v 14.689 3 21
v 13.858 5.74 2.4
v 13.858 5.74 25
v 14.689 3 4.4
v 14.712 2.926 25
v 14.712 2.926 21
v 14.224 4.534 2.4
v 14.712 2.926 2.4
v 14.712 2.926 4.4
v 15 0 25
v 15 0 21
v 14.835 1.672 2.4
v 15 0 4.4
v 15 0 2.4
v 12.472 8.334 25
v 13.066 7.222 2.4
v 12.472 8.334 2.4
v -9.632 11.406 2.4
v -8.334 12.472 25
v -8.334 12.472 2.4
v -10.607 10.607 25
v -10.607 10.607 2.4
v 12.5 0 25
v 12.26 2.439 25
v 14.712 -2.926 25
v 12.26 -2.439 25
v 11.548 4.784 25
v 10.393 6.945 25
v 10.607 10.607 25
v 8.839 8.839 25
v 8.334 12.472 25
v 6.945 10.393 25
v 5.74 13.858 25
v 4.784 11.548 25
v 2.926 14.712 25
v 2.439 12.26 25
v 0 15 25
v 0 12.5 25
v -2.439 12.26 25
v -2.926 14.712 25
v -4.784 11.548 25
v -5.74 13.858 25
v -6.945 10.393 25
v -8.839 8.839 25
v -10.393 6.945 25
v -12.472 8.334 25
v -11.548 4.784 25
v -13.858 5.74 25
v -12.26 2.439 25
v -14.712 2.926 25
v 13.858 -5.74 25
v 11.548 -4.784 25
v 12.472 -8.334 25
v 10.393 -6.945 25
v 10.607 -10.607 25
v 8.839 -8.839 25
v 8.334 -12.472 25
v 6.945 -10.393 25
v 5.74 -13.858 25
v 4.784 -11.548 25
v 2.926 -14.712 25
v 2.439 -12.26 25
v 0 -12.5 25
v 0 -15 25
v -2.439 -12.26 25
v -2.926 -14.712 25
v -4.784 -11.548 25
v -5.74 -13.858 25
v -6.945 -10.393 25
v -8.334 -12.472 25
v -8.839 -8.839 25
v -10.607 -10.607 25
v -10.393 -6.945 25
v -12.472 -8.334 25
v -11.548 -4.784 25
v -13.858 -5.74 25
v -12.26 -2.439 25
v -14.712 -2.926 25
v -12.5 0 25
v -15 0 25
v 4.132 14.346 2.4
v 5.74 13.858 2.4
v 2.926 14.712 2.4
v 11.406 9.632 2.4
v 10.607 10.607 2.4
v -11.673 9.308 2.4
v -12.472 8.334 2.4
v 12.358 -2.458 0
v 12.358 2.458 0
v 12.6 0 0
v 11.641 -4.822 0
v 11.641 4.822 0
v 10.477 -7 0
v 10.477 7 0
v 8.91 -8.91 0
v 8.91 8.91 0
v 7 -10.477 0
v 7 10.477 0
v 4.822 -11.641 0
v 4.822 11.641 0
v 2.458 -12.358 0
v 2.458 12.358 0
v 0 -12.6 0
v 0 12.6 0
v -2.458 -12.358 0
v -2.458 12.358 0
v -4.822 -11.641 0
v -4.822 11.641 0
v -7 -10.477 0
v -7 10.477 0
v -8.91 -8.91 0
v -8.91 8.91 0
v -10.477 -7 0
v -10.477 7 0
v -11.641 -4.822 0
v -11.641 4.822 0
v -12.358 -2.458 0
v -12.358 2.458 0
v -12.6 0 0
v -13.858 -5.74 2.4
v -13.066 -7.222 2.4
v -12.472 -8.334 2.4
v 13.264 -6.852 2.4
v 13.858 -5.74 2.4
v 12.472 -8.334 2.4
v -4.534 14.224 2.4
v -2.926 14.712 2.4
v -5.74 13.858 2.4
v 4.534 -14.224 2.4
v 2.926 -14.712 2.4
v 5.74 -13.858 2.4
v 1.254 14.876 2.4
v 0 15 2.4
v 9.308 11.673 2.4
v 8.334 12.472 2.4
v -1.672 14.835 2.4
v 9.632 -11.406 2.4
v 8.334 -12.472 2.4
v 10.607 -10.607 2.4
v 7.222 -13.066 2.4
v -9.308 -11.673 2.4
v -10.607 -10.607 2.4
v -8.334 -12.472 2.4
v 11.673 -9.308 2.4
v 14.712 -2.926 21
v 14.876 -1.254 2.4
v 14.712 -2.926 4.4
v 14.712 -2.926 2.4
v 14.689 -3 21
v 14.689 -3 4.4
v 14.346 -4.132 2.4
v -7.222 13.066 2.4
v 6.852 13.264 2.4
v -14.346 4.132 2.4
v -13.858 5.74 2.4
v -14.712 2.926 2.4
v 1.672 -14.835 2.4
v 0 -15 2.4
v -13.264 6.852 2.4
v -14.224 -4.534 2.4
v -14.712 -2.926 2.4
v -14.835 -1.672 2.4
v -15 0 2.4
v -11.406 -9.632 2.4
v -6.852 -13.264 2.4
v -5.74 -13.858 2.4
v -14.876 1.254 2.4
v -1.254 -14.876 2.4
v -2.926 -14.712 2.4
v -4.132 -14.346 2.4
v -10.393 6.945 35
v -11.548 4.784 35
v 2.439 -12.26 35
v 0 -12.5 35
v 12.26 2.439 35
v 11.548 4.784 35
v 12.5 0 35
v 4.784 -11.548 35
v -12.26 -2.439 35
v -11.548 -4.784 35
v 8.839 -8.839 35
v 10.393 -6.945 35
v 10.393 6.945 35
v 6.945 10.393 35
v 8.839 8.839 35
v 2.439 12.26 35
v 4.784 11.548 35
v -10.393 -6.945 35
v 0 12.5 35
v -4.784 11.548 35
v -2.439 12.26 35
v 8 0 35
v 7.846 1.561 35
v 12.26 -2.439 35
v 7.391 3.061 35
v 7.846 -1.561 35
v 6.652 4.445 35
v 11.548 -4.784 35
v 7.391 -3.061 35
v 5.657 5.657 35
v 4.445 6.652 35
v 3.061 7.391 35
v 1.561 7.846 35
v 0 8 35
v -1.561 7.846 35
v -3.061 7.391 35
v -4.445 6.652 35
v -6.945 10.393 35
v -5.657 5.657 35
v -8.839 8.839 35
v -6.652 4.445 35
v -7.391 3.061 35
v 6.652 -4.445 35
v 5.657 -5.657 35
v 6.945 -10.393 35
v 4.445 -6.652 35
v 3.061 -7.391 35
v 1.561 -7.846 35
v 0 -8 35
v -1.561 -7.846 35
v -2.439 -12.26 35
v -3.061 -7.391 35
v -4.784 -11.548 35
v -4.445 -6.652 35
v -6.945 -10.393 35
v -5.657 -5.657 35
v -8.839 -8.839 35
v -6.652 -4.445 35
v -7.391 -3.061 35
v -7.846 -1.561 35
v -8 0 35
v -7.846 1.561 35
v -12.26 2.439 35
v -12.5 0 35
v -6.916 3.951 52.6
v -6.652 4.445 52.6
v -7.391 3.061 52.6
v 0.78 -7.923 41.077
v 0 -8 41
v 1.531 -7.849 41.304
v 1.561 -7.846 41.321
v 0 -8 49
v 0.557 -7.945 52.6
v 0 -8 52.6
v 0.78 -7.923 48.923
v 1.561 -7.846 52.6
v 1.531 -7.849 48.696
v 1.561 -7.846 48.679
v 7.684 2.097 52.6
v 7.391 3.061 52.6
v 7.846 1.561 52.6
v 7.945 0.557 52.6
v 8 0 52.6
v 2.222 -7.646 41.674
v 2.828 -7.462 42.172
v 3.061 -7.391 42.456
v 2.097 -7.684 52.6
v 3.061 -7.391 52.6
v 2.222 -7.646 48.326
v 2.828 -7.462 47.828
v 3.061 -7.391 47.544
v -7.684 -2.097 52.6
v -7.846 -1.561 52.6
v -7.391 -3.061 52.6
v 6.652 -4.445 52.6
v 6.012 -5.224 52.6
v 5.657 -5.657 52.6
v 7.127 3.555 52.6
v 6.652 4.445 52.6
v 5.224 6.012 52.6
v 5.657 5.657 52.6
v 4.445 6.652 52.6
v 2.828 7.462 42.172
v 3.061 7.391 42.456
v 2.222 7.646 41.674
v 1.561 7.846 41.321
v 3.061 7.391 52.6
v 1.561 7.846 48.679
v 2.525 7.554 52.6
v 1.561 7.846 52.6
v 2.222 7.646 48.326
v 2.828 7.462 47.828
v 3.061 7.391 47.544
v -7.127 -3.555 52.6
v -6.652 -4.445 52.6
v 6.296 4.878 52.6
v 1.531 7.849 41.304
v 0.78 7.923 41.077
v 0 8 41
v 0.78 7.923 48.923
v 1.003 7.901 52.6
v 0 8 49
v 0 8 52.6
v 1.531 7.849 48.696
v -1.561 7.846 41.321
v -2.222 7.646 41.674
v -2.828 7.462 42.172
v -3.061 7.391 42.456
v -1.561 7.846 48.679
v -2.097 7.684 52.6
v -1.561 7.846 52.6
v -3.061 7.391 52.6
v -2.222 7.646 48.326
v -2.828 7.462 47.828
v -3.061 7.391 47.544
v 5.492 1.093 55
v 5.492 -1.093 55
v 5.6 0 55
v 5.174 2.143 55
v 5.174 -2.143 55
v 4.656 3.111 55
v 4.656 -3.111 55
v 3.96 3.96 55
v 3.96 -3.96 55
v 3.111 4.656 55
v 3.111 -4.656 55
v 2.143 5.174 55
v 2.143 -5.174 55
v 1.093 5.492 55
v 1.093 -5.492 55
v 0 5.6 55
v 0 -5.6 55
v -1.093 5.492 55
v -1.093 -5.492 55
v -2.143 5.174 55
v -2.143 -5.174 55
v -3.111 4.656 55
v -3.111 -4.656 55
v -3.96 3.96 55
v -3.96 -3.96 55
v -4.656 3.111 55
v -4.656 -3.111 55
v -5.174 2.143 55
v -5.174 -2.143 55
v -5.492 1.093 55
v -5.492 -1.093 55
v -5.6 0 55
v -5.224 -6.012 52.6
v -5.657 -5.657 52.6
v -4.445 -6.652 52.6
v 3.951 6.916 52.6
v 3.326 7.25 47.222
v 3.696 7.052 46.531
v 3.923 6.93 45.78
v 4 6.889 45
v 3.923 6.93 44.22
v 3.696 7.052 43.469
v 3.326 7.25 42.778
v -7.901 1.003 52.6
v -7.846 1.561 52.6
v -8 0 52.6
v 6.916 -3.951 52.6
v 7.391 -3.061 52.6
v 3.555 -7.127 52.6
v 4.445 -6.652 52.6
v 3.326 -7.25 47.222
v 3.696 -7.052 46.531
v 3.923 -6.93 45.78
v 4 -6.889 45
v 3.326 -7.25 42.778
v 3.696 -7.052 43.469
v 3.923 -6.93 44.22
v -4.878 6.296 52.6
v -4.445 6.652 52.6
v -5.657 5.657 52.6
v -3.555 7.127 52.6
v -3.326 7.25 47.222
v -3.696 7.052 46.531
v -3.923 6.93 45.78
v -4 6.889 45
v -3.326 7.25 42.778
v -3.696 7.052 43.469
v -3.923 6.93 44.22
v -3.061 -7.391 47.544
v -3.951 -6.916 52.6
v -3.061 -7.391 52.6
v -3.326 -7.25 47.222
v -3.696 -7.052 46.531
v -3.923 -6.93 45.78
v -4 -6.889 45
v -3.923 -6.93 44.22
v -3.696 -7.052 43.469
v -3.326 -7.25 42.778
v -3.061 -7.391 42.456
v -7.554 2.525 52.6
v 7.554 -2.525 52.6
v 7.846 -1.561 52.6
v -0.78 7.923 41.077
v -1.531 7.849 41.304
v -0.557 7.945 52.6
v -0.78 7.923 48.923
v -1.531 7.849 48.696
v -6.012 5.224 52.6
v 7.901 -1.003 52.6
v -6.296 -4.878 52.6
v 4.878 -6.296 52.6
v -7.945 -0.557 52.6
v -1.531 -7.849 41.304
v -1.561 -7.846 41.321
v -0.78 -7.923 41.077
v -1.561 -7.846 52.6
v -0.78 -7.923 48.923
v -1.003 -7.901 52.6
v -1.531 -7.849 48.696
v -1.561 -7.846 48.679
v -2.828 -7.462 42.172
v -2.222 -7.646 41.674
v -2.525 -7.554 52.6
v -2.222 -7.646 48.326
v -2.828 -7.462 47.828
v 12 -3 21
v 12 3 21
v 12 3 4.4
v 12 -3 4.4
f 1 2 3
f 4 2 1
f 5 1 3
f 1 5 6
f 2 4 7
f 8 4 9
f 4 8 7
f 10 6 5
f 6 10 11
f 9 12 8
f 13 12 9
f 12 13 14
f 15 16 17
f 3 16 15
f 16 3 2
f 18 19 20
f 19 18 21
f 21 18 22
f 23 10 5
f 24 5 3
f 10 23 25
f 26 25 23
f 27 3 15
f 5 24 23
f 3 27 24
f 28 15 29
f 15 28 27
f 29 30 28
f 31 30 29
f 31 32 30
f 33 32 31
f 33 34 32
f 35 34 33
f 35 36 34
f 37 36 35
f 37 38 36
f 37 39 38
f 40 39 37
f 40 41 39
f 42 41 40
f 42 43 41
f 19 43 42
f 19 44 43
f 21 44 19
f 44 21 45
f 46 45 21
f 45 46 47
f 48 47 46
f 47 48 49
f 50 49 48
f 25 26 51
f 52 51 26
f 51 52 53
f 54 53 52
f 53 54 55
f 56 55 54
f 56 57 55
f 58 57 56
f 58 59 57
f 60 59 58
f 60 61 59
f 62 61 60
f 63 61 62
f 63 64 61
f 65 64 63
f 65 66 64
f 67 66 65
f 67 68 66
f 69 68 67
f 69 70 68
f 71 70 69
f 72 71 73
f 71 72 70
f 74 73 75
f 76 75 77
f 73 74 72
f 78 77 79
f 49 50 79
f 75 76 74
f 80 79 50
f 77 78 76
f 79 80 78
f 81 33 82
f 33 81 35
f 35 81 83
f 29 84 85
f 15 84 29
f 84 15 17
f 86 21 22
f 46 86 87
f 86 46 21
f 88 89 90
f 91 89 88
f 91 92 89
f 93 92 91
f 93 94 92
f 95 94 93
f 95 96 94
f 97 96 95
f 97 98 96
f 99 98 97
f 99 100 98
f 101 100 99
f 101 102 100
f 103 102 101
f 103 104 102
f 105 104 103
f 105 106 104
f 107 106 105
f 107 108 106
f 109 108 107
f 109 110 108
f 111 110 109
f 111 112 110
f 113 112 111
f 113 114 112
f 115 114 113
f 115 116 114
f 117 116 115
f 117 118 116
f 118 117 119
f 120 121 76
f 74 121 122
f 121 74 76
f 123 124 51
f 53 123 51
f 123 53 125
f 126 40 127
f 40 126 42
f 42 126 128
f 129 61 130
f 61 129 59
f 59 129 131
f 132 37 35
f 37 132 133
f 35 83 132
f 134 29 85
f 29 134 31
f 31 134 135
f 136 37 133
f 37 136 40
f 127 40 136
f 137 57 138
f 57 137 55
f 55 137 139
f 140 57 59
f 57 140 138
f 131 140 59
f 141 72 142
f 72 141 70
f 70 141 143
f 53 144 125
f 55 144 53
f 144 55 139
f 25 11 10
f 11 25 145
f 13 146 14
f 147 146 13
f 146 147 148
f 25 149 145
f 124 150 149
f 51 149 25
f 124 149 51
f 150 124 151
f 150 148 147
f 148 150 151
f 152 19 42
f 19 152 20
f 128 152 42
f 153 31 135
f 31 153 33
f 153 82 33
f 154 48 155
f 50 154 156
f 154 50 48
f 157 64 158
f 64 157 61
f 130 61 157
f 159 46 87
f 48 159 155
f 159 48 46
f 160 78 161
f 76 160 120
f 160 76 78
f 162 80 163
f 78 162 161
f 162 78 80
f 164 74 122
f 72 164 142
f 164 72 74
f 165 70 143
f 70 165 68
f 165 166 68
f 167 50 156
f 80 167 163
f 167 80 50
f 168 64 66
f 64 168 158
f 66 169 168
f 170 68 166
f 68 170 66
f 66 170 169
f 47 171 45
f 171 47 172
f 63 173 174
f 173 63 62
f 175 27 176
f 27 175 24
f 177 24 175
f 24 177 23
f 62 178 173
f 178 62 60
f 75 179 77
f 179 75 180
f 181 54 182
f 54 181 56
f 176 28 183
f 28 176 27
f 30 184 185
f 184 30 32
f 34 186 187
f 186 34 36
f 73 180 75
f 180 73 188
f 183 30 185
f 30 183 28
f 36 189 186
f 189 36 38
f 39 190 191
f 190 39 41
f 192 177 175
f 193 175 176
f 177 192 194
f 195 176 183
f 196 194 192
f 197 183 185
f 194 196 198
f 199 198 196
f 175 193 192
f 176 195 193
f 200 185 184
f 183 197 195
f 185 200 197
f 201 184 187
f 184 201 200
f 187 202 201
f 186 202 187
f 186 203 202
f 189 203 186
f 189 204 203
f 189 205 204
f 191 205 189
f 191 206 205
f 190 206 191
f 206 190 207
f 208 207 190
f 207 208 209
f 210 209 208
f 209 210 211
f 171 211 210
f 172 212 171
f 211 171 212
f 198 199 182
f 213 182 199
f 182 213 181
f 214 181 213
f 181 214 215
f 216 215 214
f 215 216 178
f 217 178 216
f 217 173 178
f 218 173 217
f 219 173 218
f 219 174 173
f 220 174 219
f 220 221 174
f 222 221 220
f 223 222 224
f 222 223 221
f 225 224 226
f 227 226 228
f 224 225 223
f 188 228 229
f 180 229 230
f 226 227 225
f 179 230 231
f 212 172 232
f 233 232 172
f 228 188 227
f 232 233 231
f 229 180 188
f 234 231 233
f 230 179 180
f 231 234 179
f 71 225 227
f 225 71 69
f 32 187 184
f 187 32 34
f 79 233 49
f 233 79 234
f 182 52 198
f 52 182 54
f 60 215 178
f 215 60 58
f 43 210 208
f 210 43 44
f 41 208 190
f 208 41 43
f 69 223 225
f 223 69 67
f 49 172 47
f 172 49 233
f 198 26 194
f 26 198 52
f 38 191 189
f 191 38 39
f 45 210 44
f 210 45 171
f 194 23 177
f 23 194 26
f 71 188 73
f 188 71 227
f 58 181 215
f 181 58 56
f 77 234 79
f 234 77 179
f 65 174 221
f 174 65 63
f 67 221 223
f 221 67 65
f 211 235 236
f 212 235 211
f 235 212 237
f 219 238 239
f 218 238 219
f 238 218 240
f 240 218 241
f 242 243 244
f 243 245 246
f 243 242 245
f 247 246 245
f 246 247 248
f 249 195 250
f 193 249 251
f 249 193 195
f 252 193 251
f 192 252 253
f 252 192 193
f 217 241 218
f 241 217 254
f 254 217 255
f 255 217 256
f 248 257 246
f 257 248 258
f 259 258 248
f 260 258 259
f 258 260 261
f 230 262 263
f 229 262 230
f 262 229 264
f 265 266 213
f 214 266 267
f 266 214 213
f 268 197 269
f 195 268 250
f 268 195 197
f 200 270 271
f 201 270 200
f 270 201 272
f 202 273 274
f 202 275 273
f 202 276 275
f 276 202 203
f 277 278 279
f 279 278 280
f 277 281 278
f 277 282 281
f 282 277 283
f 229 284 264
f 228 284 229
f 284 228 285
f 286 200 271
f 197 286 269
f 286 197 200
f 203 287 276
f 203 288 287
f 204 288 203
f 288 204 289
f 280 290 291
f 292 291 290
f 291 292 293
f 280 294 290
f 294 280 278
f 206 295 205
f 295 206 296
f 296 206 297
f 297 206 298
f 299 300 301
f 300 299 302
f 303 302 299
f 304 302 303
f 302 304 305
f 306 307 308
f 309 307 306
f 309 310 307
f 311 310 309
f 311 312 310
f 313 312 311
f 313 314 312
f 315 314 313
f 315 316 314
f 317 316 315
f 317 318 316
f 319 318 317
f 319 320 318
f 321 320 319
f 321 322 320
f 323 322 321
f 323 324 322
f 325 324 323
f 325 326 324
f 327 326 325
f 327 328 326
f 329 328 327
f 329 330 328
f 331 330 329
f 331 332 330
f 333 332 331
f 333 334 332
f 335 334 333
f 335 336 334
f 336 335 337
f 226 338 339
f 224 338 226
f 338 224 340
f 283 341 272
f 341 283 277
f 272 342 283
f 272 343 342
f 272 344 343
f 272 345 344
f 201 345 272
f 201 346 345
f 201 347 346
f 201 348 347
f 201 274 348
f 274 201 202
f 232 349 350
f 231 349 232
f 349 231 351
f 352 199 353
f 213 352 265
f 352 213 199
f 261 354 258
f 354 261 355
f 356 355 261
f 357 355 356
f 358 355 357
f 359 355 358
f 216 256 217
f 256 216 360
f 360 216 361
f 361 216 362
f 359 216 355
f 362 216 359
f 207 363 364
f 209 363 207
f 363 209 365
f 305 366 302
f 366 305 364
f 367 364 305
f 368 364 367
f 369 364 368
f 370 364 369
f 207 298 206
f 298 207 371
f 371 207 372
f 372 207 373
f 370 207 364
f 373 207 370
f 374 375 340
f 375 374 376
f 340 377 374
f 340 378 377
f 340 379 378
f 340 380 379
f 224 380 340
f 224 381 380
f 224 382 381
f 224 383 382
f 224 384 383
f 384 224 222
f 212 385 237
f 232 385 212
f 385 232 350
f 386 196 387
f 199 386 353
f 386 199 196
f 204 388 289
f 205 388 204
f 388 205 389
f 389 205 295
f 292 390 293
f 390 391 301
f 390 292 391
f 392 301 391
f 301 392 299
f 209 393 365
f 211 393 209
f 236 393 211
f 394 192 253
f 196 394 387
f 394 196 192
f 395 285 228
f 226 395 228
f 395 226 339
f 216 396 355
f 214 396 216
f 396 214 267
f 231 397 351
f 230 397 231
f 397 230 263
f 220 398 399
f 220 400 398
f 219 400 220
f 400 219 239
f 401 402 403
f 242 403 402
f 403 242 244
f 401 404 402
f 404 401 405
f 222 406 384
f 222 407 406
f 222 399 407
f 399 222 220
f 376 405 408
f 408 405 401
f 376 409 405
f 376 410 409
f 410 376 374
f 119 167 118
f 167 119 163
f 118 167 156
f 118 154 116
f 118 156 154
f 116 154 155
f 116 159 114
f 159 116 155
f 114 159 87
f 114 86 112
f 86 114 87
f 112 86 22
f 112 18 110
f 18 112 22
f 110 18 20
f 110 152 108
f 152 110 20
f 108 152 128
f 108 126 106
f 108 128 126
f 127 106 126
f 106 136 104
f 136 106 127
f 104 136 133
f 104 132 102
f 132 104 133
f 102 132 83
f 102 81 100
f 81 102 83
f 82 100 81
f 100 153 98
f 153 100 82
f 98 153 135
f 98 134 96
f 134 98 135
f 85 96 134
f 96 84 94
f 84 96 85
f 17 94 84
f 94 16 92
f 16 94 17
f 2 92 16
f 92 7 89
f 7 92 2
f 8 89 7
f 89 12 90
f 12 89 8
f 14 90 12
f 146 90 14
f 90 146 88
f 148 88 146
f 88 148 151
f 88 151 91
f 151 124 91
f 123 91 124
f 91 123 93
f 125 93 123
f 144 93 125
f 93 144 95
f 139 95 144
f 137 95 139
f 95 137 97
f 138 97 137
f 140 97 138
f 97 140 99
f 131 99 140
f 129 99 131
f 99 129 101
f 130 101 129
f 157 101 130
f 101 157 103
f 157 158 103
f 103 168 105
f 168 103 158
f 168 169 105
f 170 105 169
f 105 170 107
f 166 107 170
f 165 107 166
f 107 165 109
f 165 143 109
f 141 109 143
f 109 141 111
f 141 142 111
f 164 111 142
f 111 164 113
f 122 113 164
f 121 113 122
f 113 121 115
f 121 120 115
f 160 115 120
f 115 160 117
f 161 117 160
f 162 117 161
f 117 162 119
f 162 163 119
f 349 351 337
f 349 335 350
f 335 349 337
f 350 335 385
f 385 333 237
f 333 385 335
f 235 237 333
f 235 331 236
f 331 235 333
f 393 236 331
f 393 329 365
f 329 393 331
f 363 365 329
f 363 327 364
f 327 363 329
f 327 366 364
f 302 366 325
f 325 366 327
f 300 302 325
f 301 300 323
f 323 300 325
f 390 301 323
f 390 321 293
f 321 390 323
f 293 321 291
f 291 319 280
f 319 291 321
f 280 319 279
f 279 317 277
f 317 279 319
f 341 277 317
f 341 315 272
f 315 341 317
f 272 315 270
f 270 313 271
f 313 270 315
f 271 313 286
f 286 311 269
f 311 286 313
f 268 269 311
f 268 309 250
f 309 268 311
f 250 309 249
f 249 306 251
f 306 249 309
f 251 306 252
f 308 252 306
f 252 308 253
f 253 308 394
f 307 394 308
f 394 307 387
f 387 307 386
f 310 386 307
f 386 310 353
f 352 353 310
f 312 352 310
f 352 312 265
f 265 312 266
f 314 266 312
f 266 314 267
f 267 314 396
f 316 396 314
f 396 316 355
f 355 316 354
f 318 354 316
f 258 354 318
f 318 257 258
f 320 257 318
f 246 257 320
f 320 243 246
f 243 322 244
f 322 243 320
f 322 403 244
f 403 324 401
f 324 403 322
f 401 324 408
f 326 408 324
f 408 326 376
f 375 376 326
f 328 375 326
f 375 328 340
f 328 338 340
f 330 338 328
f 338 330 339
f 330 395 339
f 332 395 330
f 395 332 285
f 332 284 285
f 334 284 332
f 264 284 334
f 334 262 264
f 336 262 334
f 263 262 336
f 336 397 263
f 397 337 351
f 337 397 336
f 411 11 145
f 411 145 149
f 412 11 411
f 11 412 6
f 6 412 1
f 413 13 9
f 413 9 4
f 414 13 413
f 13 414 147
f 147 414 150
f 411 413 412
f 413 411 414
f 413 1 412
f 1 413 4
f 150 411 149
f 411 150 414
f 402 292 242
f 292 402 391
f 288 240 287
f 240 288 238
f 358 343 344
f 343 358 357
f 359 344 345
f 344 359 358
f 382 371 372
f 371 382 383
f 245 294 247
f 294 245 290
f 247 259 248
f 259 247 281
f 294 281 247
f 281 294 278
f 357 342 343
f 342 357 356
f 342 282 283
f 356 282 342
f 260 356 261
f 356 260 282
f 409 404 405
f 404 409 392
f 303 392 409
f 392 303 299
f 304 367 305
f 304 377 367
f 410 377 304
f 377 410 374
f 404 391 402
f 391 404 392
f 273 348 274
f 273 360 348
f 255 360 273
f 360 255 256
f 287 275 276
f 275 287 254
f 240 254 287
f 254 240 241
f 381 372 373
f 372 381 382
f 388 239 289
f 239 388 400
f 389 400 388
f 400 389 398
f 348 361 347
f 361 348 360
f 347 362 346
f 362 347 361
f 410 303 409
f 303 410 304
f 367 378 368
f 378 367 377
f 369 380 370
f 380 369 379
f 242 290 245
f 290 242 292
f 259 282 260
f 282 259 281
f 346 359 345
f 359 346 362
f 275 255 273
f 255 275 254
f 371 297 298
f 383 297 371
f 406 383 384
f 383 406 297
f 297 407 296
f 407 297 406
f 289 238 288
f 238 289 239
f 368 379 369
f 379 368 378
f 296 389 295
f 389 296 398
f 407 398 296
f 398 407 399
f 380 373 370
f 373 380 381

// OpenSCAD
$fn = 32;

// ----------------------------------------------------------------------
// Stepped shaft: diameters 30, 25, 16 mm, 55 mm long
// ----------------------------------------------------------------------

// --- parameters (mm) ---
d1 = 30;                  // step 1 diameter
len1 = 25;                // step 1 length
d2 = 25;                  // step 2 diameter
len2 = 10;                // step 2 length
d3 = 16;                  // step 3 diameter
len3 = 20;                // step 3 length
total = 55;               // overall length
chamfer = 2.4;            // end chamfer
key_w = 6;                // keyway width
key_d = 3;                // keyway depth
key_len = 16.6;           // keyway length
key_z = 4.4;              // keyway start along the shaft
cross_d = 8;              // cross pin hole
cross_z = 45;             // cross hole position

difference() {
  /* turned body: stacked cylinders, every step sunk into the bigger one */
  union() {
    cylinder(h = len1, d = d1);
    translate([0, 0, 24.6]) cylinder(h = 10.4, d = d2);
    translate([0, 0, 34.6]) cylinder(h = 20.4, d = d3);
  }
  /* bottom chamfer ring cut */
  rotate_extrude() translate([12.6, -2.5]) polygon([[0, 0], [4.9, 0], [4.9, 7.4], [0, 2.5]]);
  /* top chamfer ring cut */
  rotate_extrude() translate([5.6, 55]) polygon([[0, 0], [4.9, -4.9], [4.9, 2.5], [0, 2.5]]);
  /* keyway milled along the first step */
  translate([d1 / 2 - key_d, -key_w / 2, key_z]) cube([key_d + 2.5, key_w, key_len]);
  /* cross pin hole through the small step */
  translate([0, 0, cross_z]) rotate([90, 0, 0]) cylinder(h = d3 + 5, d = cross_d, center = true);
}
